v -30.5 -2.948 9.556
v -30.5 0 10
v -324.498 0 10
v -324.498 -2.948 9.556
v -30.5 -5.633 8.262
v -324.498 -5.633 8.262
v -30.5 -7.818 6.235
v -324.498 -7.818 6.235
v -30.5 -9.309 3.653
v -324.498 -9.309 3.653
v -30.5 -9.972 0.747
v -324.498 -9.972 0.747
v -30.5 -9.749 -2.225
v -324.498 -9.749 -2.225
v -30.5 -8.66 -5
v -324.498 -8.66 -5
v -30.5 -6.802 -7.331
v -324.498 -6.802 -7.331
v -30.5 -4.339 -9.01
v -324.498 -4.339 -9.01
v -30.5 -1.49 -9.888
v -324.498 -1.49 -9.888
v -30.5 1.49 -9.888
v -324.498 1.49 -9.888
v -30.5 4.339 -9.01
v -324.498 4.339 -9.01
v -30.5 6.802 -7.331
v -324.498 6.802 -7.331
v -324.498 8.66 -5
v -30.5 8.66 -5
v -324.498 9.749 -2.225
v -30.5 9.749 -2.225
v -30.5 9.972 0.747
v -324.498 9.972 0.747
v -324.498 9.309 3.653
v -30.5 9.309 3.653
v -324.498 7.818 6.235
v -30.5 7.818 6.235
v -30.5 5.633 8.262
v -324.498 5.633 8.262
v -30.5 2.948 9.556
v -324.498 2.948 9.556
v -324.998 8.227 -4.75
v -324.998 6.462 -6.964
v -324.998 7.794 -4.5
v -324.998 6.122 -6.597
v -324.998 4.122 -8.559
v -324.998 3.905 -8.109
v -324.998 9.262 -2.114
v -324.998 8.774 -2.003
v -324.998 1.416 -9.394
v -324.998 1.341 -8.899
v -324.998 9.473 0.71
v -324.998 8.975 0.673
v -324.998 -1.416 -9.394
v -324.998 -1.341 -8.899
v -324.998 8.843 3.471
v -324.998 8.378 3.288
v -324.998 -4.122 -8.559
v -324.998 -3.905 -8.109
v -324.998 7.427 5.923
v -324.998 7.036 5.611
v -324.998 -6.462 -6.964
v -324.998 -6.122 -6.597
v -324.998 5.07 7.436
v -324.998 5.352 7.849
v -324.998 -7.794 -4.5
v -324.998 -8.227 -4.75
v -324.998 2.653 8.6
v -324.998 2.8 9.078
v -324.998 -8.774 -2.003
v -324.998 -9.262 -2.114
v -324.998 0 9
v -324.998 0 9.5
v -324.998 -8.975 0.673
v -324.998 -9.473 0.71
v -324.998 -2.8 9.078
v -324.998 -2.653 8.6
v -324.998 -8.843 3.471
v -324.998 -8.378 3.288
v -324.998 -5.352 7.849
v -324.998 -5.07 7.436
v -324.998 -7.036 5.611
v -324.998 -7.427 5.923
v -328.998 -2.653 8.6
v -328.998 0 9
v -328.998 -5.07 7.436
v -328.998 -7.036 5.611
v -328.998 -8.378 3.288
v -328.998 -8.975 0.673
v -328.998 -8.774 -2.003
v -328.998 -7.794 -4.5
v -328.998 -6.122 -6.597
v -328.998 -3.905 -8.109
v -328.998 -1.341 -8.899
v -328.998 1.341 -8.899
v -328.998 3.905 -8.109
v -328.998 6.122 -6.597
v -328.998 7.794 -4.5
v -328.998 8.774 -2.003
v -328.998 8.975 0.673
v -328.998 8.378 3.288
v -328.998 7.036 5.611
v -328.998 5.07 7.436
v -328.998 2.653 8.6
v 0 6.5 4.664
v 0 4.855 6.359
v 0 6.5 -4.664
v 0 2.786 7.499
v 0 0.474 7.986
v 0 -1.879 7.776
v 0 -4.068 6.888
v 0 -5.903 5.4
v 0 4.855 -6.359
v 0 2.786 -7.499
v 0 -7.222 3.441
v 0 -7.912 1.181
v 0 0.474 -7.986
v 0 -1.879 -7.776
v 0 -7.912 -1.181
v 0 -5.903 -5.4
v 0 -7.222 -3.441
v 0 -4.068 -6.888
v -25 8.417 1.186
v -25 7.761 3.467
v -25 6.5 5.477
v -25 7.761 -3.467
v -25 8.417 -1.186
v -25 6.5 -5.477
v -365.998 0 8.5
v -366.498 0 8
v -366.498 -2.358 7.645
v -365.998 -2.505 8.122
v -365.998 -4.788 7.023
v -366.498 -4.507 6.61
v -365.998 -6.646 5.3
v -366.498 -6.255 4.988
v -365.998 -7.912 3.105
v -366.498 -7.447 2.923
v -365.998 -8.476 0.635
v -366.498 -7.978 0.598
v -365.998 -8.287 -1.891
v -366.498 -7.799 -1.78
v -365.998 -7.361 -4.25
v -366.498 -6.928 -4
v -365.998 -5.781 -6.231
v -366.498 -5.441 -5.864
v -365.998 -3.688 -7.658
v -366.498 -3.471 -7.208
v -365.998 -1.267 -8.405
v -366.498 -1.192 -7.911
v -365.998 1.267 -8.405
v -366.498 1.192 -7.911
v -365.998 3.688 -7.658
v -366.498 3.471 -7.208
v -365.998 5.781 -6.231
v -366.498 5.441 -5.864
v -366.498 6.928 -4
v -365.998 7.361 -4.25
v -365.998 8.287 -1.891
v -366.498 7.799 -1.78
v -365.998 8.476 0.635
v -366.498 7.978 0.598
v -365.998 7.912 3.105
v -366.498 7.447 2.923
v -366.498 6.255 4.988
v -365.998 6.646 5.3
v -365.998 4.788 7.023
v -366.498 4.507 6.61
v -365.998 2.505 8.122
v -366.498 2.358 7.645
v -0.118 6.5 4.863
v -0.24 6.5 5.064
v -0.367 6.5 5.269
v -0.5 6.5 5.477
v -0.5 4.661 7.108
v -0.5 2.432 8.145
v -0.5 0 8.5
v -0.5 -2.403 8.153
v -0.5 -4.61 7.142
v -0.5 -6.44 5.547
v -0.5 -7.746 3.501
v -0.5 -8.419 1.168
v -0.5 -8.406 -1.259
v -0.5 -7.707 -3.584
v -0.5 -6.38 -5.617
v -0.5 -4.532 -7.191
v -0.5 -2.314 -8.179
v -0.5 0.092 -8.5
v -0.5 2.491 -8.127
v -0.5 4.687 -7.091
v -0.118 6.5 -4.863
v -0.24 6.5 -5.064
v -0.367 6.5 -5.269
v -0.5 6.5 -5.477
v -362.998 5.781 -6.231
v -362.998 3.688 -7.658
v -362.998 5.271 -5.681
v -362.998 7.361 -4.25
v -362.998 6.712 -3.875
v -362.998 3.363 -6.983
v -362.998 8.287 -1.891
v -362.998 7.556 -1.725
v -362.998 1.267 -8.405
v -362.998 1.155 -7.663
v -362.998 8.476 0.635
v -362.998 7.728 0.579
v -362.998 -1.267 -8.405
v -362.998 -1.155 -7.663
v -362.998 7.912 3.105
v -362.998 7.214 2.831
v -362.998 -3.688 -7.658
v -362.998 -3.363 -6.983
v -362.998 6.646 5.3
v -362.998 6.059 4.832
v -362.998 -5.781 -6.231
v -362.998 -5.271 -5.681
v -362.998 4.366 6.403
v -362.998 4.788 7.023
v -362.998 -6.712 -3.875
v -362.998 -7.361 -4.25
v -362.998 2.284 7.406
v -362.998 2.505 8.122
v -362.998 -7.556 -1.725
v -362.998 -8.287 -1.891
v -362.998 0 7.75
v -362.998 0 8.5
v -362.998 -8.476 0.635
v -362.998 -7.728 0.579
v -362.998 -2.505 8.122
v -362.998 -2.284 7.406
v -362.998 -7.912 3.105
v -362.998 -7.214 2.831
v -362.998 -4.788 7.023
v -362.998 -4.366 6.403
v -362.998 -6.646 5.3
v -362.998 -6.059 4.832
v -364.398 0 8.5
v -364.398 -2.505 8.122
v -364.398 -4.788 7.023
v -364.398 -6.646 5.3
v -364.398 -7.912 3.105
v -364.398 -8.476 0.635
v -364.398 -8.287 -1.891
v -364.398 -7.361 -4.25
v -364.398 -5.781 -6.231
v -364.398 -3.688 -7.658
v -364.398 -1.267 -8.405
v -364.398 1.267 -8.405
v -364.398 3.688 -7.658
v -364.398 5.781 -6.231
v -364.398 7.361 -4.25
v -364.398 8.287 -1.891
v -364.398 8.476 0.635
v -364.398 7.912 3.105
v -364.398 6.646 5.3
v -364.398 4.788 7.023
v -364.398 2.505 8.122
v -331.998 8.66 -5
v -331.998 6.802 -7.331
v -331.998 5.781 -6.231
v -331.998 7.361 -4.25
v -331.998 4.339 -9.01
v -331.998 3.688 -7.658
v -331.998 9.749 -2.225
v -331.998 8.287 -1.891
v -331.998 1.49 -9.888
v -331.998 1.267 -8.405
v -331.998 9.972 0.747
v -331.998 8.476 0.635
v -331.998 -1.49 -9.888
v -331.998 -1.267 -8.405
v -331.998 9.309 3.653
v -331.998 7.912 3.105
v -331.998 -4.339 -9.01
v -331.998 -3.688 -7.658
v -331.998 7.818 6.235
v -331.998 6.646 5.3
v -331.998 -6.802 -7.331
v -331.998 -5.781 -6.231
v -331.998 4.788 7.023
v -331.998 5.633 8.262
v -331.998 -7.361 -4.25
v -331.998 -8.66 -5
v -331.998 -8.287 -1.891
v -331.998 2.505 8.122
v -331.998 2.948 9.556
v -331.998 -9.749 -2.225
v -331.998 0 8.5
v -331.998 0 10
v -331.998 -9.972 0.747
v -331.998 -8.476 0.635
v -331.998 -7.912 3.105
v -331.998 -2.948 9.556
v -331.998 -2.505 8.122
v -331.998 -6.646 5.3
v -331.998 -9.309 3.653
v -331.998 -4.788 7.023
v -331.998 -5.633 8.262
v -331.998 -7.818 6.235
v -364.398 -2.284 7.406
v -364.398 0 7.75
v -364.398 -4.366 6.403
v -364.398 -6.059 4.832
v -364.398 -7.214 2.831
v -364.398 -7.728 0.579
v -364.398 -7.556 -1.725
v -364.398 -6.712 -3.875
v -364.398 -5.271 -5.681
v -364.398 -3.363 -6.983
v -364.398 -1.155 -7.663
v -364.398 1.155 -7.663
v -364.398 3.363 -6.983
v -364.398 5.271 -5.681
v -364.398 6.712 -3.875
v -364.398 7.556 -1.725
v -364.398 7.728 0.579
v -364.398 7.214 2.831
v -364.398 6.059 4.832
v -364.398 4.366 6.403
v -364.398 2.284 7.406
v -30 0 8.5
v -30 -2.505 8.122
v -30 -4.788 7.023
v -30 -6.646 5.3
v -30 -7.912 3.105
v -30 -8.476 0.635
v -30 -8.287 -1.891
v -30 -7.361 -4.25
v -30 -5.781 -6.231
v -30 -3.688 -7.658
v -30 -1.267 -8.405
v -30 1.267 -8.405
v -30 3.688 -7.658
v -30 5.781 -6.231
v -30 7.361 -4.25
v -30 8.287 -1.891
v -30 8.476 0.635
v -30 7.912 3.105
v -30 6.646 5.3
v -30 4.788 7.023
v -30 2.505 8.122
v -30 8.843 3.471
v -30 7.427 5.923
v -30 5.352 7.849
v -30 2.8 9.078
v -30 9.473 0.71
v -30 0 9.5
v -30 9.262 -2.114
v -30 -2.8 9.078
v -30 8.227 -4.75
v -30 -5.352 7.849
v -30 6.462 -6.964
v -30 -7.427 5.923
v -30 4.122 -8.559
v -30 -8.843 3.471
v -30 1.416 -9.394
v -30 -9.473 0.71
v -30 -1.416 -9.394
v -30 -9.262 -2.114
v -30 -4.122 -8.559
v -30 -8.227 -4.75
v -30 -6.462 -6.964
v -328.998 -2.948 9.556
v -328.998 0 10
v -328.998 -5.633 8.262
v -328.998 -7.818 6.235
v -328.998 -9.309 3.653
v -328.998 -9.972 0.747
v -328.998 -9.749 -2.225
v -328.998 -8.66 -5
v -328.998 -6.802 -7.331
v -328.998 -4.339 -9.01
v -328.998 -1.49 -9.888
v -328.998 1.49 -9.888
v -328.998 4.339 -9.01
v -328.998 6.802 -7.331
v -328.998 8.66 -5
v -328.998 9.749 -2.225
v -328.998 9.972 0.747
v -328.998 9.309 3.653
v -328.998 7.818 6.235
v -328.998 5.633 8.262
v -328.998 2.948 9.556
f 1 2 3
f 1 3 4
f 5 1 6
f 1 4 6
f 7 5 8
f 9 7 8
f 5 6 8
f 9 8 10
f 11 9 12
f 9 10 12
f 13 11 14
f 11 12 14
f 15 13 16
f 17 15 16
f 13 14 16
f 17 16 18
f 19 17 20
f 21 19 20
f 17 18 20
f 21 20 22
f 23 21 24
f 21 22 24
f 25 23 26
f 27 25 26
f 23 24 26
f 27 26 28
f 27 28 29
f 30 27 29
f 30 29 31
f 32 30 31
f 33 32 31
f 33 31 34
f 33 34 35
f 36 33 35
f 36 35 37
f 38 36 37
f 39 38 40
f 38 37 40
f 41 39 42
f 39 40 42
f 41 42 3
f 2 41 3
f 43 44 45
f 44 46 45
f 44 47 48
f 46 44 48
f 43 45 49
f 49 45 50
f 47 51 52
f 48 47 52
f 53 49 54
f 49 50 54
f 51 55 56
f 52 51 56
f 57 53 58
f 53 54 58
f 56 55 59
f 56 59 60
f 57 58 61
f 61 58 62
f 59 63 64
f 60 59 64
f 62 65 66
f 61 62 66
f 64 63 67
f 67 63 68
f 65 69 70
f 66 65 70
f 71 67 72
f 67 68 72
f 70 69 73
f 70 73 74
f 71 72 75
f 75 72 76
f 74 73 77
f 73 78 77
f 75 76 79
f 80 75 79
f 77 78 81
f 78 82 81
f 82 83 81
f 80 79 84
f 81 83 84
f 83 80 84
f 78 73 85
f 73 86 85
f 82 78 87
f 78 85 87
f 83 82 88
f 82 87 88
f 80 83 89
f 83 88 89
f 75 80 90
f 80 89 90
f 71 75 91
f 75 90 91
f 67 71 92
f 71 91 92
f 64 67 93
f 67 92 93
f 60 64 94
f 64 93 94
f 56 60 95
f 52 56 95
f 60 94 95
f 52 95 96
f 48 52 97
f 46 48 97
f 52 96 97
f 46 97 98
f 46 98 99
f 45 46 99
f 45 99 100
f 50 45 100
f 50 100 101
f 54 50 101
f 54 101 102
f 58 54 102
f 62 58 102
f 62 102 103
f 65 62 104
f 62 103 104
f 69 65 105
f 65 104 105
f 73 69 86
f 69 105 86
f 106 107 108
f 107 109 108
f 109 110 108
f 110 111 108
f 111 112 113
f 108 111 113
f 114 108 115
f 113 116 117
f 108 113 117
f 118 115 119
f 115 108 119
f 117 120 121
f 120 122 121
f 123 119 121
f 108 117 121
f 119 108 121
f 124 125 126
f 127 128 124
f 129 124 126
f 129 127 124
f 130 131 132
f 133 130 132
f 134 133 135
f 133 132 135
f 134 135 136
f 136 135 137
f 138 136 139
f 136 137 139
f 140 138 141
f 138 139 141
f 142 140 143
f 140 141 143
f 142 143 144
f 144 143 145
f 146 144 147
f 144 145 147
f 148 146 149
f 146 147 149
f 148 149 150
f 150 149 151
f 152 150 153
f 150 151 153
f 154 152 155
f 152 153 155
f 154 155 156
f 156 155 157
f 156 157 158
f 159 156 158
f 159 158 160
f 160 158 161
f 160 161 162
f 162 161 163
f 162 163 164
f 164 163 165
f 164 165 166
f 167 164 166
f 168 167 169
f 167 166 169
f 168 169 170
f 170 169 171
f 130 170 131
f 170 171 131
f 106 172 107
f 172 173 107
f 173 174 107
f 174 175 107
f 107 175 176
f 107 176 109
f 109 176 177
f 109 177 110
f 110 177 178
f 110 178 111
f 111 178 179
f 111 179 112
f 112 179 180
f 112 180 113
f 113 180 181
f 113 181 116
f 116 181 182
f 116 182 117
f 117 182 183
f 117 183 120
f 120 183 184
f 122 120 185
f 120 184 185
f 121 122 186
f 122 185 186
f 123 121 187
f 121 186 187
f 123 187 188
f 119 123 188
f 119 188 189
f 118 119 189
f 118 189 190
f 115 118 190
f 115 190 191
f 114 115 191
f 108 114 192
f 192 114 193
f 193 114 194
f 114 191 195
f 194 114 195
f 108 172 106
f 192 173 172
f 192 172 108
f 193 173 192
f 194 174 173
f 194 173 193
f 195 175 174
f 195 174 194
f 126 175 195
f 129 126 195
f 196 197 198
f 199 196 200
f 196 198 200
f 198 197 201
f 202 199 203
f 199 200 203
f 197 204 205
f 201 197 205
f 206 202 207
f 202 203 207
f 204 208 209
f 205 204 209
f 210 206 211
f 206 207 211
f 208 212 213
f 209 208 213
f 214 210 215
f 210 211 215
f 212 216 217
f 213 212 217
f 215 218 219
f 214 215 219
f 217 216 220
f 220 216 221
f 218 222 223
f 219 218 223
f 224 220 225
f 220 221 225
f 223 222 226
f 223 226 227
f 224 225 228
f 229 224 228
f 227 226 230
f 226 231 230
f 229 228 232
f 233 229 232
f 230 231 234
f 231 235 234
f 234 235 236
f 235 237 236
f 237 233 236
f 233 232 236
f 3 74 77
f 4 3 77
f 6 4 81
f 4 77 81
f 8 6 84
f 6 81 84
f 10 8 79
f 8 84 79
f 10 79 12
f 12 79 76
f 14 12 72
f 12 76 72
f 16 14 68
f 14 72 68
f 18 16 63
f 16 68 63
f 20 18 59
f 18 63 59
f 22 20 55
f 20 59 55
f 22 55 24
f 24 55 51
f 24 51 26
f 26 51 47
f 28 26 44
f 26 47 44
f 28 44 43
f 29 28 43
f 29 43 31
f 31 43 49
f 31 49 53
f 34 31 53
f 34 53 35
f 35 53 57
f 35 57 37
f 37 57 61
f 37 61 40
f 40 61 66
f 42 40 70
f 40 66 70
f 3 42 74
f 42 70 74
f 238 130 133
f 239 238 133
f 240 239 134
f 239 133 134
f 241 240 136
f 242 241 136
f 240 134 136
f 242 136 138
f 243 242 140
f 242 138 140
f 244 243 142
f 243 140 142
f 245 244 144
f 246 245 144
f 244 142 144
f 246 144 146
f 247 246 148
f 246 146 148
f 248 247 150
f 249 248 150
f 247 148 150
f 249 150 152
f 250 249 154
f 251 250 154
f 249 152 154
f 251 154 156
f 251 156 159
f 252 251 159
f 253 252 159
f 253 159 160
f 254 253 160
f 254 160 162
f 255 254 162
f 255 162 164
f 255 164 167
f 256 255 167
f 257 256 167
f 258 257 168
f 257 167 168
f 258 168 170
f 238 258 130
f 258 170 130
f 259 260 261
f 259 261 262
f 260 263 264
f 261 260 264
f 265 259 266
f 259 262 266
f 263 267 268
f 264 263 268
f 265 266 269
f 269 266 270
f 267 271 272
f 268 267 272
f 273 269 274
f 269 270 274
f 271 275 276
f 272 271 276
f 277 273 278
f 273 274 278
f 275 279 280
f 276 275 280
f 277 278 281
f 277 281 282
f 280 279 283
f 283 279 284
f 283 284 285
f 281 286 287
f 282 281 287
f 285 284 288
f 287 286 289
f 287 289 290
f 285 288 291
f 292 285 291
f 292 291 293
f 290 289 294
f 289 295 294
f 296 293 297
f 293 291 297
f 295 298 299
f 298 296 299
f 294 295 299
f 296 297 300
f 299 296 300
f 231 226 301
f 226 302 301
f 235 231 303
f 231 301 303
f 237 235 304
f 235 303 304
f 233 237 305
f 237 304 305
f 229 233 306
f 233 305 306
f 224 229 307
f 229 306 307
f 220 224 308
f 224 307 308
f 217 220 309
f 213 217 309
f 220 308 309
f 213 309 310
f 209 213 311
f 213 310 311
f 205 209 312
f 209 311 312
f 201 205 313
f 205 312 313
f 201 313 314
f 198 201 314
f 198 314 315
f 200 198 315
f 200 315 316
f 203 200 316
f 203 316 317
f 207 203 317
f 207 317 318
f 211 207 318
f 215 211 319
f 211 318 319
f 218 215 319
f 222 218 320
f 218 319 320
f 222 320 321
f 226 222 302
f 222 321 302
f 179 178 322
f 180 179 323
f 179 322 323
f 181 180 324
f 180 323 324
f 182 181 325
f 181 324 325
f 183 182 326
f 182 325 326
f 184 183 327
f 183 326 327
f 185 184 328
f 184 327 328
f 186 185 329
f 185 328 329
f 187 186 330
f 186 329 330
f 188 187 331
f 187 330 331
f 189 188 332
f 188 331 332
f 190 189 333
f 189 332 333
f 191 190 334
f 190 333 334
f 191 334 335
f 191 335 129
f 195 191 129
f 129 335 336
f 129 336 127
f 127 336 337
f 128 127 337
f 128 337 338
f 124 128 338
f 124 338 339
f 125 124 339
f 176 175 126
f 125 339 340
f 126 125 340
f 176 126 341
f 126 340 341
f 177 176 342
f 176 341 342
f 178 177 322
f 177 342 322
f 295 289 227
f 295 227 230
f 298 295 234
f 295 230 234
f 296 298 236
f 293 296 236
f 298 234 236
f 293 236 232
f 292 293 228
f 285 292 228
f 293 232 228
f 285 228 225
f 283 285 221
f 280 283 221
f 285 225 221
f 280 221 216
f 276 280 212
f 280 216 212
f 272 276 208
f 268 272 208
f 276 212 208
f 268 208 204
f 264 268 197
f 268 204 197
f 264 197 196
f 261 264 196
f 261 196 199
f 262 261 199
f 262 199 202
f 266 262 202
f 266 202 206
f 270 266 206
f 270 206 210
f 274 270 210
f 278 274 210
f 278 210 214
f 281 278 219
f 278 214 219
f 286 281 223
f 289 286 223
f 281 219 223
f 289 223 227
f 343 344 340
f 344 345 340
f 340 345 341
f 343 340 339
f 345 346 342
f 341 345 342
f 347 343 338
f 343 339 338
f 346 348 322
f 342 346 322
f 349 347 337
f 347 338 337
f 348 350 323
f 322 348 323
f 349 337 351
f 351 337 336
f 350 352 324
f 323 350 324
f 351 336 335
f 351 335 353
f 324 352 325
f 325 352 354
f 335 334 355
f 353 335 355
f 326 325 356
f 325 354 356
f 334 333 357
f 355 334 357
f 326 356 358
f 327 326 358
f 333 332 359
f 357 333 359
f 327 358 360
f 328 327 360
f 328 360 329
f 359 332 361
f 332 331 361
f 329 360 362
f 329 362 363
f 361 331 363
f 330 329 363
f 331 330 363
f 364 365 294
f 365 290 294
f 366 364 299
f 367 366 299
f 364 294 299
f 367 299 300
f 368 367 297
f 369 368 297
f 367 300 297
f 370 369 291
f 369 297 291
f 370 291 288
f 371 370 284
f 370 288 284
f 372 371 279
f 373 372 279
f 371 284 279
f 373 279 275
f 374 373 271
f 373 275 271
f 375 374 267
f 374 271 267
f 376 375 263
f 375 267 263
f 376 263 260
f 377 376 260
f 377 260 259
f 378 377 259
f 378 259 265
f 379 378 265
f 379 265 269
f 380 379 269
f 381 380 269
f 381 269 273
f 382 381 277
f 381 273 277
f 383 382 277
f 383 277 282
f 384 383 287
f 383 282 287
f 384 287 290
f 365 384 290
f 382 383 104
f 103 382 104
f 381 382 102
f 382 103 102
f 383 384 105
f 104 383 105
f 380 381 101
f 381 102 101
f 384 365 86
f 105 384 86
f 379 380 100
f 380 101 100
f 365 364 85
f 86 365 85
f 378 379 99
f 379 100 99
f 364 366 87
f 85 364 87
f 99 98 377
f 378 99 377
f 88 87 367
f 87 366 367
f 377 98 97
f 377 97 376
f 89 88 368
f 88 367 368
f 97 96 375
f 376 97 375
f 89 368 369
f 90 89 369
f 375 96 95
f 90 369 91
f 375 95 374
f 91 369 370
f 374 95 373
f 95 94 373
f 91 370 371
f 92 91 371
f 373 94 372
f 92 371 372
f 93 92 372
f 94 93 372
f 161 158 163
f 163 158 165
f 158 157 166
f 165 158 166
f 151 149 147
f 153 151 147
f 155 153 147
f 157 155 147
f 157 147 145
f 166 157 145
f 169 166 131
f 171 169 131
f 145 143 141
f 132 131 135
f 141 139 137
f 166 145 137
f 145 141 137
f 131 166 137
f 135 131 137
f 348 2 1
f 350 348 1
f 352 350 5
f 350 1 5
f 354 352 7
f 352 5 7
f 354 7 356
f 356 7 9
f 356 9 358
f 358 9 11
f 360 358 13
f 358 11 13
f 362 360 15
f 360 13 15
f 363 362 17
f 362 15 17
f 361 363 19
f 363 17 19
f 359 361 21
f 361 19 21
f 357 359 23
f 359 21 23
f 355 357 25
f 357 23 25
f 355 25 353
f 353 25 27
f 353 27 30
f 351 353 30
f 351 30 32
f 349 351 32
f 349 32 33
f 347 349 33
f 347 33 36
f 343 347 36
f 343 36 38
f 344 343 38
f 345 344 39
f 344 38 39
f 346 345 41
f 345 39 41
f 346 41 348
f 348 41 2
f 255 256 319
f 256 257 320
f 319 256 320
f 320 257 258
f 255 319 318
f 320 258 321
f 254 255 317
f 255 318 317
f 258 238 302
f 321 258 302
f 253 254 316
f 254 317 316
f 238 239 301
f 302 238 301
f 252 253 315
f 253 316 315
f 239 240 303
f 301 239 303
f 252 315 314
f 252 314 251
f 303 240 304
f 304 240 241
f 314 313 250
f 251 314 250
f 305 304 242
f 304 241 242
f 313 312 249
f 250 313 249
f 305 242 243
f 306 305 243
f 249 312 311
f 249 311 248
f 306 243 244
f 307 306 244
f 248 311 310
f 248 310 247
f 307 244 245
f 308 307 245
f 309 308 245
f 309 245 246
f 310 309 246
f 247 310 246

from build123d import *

# Parameters (mm, degrees)
CHAMFER_1_SIZE      = 0.5
CUT_EXTRUDE_START   = -25
CUT_EXTRUDE_1_DEPTH = 25


with BuildPart() as part:
    # Эскиз1 → Повернуть1 (revolve)
    with BuildSketch(Plane.XY):
        Polygon((0, 0), (0, 8.5), (-30, 8.5), (-30, 10), (-324.998327755, 10), (-324.998327755, 9), (-328.998327755, 9), (-328.998327755, 10), (-331.998327755, 10), (-331.998327755, 8.5), (-362.998327755, 8.5), (-362.998327755, 7.75), (-364.398327755, 7.75), (-364.398327755, 8.5), (-366.498327755, 8.5), (-366.498327755, 0), align=None)
    revolve(axis=Axis((-850.209513438, 0, 0), (1, 0, 0)))

    # Фаска1
    chamfer_1_edges = [part.edges().sort_by_distance(p)[0] for p in [
        (-30, -10, 0),
        (0, -8.5, 0),
        (-324.998327755, -10, 0),
        (-366.498327755, -8.5, 0),
    ]]
    chamfer(chamfer_1_edges, length=CHAMFER_1_SIZE)

    # Эскиз2 → Вырез-Вытянуть1 (cut)
    with BuildSketch(Plane(origin=(0, 0, 0), x_dir=(0, 0, -1), z_dir=(1, 0, 0)).offset(CUT_EXTRUDE_START)):
        with BuildLine():
            Line((-5.477225575, 6.5), (5.477225575, 6.5))
            ThreePointArc((5.477225575, 6.5), (0, 8.5), (-5.477225575, 6.5))
        make_face()
    extrude(amount=CUT_EXTRUDE_1_DEPTH, mode=Mode.SUBTRACT)


solid = part.part
